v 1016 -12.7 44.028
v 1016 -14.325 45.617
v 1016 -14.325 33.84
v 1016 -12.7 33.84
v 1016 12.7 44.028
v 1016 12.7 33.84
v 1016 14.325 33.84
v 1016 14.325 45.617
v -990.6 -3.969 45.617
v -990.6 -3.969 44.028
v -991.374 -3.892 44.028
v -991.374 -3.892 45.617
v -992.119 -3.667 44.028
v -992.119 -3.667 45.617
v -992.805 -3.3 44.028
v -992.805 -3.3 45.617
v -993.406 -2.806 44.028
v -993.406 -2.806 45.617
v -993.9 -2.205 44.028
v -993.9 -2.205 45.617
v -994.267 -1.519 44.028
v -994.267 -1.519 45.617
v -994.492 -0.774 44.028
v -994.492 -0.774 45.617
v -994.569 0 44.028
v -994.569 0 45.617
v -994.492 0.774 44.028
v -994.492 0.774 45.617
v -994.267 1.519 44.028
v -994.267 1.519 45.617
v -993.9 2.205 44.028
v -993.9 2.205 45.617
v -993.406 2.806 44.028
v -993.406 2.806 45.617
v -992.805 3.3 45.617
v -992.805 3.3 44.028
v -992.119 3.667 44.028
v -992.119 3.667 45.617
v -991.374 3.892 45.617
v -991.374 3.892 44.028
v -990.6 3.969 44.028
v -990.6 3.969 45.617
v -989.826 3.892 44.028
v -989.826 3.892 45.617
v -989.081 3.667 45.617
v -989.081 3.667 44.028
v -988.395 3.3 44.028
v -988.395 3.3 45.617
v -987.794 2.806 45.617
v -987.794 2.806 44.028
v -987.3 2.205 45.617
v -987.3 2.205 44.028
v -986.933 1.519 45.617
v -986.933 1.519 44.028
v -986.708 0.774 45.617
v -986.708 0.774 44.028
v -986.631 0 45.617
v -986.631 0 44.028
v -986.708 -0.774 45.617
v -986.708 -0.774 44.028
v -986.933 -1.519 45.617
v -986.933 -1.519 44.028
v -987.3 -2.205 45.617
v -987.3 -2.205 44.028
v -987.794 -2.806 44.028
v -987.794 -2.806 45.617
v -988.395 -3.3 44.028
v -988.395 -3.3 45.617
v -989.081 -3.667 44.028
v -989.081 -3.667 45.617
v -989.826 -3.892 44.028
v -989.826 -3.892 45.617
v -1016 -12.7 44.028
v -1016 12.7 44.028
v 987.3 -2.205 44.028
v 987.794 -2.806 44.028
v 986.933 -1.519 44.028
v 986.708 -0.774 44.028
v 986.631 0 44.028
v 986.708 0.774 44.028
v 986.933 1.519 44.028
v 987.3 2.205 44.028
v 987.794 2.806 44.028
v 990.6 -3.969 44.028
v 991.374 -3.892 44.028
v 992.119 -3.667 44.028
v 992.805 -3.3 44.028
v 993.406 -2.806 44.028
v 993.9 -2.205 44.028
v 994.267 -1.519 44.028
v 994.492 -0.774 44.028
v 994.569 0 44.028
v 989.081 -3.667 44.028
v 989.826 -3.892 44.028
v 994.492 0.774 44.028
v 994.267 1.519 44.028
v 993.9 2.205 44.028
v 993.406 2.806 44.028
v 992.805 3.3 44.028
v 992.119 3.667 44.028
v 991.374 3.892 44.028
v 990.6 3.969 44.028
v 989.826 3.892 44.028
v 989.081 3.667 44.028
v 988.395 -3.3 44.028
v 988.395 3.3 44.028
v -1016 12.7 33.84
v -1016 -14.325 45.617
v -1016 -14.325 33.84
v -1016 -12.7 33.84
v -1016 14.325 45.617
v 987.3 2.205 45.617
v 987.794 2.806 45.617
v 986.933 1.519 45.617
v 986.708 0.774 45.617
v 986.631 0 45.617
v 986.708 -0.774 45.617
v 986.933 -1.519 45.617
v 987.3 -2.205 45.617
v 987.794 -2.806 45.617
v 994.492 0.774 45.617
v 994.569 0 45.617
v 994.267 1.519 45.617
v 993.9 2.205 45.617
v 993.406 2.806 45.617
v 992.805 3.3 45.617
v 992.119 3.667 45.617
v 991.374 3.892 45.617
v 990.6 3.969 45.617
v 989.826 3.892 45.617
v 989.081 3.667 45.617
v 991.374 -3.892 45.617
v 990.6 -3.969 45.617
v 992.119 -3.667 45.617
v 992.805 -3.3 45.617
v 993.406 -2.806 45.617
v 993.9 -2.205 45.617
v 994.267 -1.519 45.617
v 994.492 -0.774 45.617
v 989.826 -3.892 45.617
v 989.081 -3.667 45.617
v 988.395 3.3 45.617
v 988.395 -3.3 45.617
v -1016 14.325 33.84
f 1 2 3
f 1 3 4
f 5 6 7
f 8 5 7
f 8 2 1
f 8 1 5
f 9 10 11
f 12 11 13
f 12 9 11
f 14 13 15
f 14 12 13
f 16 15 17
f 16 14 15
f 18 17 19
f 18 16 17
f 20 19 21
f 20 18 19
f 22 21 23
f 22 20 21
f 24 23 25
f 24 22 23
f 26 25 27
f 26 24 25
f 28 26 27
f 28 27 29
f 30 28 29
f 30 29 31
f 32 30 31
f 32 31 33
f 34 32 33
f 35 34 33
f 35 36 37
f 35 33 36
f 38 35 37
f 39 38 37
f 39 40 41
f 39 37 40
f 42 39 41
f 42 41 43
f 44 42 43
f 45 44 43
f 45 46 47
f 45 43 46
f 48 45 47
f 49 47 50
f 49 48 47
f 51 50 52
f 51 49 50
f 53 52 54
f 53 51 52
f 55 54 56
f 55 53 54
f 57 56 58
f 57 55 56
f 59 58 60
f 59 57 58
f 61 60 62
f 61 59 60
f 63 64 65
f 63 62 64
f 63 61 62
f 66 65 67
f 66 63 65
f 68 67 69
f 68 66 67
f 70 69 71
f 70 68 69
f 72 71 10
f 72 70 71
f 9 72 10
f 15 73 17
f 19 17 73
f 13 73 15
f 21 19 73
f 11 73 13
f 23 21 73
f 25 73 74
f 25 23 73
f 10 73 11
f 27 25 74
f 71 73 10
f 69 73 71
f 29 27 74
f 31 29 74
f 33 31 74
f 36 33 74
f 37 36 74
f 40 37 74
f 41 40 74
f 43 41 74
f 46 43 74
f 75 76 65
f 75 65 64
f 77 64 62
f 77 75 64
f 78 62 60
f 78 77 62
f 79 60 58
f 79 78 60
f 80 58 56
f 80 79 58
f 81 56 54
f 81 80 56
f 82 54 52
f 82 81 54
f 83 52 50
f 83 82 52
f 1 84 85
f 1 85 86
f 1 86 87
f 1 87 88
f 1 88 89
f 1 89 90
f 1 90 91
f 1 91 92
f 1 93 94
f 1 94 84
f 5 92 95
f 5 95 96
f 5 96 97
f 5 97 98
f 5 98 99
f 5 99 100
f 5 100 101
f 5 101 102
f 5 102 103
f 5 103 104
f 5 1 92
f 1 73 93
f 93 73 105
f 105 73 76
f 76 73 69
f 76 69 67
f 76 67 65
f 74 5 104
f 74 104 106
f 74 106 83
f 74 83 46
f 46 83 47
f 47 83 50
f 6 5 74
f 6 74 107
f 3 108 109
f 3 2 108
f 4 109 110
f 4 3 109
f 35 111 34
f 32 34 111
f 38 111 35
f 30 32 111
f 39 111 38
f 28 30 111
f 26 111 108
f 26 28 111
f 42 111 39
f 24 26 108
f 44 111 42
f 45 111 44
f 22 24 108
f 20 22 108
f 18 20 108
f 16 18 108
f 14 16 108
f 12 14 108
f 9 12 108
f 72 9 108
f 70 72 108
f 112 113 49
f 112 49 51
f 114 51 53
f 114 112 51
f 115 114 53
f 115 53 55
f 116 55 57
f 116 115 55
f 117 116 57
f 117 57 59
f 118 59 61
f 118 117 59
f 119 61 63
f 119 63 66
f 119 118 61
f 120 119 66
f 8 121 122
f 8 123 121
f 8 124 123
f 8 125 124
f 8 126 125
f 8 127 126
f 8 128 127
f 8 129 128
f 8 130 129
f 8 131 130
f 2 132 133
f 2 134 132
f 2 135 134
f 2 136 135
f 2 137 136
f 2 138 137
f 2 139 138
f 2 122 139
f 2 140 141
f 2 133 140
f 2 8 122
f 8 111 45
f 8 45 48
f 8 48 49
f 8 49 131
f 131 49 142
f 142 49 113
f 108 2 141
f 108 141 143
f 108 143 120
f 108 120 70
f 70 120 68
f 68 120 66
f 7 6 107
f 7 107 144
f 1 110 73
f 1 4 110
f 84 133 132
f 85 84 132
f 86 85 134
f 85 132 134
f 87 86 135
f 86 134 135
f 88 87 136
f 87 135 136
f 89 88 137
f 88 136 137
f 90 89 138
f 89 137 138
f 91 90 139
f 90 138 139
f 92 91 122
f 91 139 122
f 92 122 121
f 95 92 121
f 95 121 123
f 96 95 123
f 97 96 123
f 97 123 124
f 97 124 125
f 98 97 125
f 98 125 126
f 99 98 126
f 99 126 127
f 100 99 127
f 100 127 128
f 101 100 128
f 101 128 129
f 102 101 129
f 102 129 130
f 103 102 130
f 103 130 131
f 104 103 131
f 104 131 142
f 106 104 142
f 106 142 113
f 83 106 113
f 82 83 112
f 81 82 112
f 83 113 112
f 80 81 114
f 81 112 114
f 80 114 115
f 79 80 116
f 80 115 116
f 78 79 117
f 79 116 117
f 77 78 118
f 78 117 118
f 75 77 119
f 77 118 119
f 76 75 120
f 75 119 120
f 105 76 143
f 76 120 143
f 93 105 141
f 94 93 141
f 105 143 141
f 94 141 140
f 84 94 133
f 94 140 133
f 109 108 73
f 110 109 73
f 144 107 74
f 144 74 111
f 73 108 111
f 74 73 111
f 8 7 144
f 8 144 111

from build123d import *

# Parameters (mm, degrees)
PAD001_DEPTH = 1016
SKETCH_R     = 3.96875
POCKET_DEPTH = 6.35


with BuildPart() as part:
    # Sketch004 → Pad001 (new body, symmetric)
    with BuildSketch(Plane.YZ):
        Polygon((-12.7, 14.789829), (-12.7, 24.977896), (12.7, 24.977896), (12.7, 14.789829), (14.325, 14.789829), (14.325, 26.566591), (-14.325, 26.566591), (-14.325, 14.789829), align=None)
    extrude(amount=PAD001_DEPTH, both=True)

    # Sketch (on Face6 of Pad001) → Pocket (cut)
    with BuildSketch(Plane(origin=(0, 0, 26.566591), x_dir=(0, -1, 0), z_dir=(0, 0, 1))):
        with Locations((0, 990.6)):
            Circle(SKETCH_R)
    pocket = extrude(amount=-POCKET_DEPTH, mode=Mode.SUBTRACT)

    # Mirrored: Pocket across Sketch H_Axis
    add(pocket.mirror(Plane(origin=(0, 0, 26.566591), x_dir=(0, 0, 1), z_dir=(1, 0, 0))), mode=Mode.SUBTRACT)


with BuildPart() as part_1:
    # Body001 placement: moved
    add(part.part.moved(Location((0, 0, 19.05))))


solid = part_1.part
